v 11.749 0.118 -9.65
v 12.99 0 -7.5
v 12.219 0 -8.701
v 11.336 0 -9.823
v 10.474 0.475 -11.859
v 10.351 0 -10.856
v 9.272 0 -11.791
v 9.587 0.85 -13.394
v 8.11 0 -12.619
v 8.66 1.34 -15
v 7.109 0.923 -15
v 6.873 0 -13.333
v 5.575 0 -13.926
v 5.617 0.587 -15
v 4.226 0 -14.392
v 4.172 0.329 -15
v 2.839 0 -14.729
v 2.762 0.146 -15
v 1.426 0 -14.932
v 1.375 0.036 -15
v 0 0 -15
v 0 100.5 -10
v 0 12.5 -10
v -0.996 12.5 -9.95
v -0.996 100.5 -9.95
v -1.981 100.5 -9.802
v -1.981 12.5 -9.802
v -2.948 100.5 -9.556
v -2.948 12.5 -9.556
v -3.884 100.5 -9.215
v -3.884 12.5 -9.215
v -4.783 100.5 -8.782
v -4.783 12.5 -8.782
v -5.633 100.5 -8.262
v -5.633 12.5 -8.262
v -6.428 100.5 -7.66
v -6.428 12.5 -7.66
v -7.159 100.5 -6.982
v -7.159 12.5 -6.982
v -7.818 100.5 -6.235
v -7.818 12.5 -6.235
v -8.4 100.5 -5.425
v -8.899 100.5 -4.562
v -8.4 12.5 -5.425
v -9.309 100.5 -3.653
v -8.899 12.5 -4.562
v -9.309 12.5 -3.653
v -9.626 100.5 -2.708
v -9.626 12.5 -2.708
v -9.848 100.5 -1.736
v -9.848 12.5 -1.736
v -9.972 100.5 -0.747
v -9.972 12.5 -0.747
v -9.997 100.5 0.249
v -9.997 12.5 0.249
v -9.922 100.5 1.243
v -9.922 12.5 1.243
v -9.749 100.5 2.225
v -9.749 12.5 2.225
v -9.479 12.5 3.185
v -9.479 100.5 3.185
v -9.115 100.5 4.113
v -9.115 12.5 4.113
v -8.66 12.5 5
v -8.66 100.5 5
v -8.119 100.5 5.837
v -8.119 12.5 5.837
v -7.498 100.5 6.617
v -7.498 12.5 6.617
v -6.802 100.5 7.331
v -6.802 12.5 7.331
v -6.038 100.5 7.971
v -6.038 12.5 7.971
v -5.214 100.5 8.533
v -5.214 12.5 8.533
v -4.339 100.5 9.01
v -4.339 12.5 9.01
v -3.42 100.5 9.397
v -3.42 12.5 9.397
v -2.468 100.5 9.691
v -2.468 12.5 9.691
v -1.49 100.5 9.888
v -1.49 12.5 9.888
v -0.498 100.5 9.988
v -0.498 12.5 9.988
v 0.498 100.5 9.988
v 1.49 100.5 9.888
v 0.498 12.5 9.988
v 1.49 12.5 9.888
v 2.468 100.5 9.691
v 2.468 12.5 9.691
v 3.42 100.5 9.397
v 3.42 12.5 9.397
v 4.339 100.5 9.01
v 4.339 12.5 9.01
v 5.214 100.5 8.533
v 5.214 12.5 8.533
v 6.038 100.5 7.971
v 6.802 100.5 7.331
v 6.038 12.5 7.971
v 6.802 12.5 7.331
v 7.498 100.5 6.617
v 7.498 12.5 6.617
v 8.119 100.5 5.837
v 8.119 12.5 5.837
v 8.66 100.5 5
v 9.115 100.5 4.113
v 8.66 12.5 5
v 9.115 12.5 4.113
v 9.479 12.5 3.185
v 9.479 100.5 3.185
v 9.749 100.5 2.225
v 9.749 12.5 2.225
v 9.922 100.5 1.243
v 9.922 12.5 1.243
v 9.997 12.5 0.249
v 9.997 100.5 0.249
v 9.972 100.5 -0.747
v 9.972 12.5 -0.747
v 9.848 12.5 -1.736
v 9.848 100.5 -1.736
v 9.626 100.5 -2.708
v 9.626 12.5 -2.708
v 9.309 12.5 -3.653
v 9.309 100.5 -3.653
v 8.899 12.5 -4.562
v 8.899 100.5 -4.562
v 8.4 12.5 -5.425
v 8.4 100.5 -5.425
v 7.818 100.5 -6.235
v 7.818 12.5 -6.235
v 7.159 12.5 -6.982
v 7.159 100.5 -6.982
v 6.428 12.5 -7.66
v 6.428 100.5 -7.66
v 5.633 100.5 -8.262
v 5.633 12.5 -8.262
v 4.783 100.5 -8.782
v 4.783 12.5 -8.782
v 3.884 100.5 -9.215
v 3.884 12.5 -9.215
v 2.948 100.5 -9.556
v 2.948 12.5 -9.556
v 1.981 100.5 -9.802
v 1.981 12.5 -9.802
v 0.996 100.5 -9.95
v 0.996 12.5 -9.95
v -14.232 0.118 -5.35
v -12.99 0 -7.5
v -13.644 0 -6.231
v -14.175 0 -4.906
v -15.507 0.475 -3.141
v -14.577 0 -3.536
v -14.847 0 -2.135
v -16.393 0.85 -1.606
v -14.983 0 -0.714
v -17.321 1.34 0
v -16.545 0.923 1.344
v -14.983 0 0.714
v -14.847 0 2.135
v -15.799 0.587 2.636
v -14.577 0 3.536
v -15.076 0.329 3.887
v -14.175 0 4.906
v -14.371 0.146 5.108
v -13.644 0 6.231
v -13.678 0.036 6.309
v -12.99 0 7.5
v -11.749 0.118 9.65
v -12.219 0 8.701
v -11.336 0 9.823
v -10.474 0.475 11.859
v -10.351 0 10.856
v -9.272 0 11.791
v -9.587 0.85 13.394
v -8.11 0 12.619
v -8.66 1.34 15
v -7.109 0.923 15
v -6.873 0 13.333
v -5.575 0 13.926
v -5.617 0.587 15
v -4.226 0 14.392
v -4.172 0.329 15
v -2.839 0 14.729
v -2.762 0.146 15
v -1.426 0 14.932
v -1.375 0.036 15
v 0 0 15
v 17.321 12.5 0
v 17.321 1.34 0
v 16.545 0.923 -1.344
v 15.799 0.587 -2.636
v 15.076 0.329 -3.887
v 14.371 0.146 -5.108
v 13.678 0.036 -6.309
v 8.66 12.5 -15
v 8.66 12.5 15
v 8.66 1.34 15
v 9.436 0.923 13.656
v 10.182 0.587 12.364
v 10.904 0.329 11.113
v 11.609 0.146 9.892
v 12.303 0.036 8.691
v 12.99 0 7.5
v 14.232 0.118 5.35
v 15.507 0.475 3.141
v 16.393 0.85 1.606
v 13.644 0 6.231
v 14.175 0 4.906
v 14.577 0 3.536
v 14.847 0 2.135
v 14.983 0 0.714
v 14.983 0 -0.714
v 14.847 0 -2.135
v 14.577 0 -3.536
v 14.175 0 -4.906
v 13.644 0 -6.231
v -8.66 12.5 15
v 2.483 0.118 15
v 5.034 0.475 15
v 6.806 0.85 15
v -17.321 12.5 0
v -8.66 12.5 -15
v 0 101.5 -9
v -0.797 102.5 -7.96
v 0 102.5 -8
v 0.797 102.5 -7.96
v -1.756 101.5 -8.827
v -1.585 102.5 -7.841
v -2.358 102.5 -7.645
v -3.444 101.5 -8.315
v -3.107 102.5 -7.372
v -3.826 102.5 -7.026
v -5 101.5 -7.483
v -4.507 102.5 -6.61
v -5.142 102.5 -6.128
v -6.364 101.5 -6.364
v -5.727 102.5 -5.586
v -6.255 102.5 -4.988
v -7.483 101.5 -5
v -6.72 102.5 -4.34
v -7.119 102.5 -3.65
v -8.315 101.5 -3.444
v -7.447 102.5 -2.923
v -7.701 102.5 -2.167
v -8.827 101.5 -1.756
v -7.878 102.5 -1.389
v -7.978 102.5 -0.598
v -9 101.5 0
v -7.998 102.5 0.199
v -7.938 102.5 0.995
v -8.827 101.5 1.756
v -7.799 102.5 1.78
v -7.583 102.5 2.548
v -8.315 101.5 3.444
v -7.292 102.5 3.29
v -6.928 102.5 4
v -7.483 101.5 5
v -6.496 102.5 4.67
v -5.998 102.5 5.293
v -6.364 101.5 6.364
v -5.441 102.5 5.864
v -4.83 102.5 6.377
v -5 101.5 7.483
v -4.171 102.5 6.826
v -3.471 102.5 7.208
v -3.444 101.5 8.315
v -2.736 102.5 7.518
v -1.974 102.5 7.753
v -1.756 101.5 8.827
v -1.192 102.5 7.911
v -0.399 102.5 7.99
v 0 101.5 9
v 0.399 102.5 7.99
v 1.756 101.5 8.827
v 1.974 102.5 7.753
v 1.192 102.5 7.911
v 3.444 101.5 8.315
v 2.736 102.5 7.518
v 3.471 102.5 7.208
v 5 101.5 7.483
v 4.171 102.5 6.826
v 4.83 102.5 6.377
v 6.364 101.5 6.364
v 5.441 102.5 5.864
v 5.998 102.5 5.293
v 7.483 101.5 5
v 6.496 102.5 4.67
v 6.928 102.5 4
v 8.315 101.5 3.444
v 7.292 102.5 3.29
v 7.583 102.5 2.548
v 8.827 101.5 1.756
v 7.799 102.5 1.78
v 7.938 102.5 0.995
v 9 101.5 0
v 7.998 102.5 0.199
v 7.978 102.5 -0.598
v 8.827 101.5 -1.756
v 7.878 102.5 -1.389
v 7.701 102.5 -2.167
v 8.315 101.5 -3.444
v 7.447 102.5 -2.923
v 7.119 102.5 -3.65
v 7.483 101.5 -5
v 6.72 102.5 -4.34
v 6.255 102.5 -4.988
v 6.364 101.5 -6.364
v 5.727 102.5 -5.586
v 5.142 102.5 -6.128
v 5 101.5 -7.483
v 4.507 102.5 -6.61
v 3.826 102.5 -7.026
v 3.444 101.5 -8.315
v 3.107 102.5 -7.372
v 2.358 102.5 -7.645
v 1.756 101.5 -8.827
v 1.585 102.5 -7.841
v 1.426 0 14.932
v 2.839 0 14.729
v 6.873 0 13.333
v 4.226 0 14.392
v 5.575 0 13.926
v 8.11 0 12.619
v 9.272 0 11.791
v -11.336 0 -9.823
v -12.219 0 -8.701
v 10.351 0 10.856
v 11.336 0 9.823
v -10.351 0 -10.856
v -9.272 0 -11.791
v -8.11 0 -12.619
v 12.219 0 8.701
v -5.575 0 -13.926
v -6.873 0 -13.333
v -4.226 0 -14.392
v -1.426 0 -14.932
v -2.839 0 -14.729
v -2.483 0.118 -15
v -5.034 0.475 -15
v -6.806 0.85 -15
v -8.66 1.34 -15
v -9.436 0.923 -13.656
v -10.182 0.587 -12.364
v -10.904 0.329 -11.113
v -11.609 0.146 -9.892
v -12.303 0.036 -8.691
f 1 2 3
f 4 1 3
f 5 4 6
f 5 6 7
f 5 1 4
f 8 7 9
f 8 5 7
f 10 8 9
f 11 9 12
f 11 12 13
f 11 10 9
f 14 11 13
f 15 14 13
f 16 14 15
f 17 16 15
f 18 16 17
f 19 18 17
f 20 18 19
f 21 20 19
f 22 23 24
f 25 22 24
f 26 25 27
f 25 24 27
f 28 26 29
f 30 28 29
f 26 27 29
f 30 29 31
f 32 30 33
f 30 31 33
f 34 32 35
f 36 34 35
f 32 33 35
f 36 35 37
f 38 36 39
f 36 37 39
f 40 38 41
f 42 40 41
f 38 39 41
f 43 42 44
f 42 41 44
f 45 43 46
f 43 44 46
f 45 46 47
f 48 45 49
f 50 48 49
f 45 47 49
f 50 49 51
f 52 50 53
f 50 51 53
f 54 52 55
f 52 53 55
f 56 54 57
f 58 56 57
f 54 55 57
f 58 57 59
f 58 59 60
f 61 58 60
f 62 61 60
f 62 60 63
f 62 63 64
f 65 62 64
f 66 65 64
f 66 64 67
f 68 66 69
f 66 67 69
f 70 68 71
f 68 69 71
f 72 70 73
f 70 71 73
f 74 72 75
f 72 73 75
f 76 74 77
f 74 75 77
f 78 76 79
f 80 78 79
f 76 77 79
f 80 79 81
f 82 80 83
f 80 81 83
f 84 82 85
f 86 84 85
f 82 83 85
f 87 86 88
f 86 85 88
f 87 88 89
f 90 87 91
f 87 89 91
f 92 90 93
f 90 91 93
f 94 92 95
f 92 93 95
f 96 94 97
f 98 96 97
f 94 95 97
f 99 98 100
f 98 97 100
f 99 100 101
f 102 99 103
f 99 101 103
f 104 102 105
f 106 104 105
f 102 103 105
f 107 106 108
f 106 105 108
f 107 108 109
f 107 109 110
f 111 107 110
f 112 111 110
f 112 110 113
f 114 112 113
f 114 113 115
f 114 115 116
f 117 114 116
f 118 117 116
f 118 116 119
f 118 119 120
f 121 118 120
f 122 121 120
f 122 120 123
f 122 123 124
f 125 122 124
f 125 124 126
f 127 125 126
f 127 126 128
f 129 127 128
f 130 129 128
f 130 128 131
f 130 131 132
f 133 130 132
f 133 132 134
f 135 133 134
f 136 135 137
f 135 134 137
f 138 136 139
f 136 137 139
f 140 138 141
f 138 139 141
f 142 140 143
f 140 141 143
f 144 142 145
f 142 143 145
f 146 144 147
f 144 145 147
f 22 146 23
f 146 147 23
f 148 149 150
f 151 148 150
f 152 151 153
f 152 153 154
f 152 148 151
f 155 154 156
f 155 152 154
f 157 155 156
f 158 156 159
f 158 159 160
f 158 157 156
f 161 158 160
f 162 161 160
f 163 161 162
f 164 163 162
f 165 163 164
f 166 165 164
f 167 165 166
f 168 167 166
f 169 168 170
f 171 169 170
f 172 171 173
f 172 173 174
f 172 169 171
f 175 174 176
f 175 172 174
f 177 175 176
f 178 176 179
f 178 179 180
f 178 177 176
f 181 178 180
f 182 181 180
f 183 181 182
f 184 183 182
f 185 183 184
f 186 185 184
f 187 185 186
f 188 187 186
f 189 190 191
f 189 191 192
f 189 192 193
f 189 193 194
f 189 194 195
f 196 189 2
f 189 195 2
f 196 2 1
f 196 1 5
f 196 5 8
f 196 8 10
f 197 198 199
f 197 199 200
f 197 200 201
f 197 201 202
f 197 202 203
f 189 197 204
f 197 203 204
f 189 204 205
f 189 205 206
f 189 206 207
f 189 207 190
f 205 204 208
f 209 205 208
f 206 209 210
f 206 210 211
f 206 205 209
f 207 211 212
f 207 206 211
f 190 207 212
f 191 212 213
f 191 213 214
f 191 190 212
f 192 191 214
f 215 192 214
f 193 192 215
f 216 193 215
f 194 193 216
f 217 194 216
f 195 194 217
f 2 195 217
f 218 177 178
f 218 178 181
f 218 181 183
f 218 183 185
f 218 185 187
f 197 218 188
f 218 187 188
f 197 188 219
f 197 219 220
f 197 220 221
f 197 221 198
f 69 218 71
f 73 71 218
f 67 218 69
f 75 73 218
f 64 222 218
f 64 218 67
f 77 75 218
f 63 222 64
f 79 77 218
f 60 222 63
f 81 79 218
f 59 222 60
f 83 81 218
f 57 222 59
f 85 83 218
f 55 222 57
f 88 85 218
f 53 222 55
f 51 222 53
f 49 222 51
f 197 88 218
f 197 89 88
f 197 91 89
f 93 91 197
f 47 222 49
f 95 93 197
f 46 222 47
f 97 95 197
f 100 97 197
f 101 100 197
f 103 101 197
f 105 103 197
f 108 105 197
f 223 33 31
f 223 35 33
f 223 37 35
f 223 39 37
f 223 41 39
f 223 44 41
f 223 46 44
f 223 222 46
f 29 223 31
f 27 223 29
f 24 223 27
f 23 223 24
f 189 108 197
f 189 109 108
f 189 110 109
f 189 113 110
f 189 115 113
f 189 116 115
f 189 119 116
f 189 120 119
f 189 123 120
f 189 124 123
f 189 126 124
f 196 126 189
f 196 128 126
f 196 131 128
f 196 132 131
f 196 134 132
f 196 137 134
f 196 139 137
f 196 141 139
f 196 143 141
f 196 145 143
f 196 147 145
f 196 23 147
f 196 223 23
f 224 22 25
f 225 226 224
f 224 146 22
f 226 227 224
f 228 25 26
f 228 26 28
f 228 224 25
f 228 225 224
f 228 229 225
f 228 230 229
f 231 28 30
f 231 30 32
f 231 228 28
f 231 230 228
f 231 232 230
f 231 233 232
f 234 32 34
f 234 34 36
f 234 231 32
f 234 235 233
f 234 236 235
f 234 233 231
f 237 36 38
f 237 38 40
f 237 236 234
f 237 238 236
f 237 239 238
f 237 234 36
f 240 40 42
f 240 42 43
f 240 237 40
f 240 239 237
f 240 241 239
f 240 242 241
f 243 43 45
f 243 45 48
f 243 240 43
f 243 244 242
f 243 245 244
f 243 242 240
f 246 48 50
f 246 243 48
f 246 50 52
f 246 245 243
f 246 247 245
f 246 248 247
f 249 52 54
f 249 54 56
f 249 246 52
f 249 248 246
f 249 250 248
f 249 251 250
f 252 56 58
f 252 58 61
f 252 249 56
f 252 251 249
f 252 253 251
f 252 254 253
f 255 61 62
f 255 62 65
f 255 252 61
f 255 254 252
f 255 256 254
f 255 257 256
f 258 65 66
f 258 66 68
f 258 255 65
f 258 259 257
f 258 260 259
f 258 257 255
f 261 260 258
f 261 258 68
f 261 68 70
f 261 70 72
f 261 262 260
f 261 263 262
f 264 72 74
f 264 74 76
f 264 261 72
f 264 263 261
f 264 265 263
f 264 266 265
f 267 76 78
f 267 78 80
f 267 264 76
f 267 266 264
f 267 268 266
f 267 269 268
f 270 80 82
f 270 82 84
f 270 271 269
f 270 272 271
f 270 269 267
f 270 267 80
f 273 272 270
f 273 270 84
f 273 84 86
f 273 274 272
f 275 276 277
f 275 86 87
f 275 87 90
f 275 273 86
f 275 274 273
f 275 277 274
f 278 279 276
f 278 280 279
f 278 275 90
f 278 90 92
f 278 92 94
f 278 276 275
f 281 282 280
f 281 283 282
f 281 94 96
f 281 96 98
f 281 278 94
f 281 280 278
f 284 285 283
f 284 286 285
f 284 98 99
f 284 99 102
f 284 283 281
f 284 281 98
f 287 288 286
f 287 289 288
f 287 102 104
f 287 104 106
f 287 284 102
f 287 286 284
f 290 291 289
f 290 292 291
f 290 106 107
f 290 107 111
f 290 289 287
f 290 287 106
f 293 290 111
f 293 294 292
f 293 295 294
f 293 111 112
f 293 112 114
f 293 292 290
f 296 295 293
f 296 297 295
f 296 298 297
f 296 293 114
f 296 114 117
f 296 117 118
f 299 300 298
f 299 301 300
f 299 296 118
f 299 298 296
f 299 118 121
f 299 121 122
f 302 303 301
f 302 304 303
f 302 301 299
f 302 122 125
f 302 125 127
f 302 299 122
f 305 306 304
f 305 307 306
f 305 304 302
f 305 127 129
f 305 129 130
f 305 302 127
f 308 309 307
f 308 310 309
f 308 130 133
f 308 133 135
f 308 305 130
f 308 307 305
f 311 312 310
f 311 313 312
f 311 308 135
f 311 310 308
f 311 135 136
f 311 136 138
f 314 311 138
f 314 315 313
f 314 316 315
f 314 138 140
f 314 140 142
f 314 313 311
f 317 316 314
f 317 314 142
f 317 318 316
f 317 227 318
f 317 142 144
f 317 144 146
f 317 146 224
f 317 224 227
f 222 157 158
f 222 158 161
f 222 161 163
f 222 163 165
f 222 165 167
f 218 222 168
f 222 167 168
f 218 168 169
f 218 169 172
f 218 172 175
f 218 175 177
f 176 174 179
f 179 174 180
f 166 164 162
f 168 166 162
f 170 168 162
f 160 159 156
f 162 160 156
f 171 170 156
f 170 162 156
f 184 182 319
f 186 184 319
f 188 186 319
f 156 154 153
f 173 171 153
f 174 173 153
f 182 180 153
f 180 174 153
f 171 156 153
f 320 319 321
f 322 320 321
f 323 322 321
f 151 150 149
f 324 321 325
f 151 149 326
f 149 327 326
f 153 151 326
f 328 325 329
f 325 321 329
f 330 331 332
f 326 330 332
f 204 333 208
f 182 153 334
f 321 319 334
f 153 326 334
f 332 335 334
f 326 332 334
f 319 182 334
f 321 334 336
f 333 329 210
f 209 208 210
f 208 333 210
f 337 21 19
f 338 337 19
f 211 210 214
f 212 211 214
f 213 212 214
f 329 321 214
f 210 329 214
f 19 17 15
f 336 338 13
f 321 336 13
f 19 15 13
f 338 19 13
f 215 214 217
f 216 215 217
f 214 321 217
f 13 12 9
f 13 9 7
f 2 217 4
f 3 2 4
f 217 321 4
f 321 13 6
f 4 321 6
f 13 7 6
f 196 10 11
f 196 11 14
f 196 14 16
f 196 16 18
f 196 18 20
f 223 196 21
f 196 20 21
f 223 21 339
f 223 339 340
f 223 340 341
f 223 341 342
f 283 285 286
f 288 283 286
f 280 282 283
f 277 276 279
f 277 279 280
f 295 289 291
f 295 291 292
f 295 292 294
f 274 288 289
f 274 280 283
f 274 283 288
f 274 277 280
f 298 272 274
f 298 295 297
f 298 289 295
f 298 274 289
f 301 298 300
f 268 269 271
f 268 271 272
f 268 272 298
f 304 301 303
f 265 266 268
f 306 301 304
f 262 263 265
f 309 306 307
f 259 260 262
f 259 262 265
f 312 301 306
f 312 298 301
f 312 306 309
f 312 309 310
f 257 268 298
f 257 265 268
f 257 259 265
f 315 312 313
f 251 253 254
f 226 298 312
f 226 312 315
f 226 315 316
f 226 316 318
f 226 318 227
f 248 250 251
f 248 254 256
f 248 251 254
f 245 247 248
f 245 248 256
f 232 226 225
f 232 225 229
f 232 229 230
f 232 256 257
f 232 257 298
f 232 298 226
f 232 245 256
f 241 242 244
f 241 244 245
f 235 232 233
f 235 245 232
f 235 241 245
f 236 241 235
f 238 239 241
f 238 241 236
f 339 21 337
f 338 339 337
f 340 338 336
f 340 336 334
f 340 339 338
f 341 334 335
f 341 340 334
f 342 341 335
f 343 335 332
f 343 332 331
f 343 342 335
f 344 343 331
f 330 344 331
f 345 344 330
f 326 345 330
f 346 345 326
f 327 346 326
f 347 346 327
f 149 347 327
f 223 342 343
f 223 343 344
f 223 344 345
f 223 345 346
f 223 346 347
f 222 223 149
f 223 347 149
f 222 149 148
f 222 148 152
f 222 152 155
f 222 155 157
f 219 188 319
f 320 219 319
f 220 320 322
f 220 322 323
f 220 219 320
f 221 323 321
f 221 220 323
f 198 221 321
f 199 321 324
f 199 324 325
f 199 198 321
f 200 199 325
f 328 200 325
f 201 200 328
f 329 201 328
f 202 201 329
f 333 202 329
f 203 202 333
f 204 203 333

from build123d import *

# Parameters (mm, degrees)
EXTRUDE_1_DEPTH = 12.5
SKETCH_2_R      = 10
EXTRUDE_2_DEPTH = 90
CHAMFER_1_SIZE  = 2


with BuildPart() as part:
    # 草图1 → 凸台-拉伸1 (new body)
    with BuildSketch(Plane(origin=(0, 0, 0), x_dir=(1, 0, 0), z_dir=(0, 1, 0))):
        Polygon((8.660254038, -15), (17.320508076, 0), (8.660254038, 15), (-8.660254038, 15), (-17.320508076, 0), (-8.660254038, -15), align=None)
    extrude(amount=EXTRUDE_1_DEPTH)

    # 草图2 → 凸台-拉伸2 (add)
    with BuildSketch(Plane(origin=(0, 12.5, 0), x_dir=(1, 0, 0), z_dir=(0, 1, 0))):
        with Locations(Location((0, 0, 0), (0, 0, 90))):
            Circle(SKETCH_2_R)
    extrude(amount=EXTRUDE_2_DEPTH)

    # 倒角1
    chamfer_1_edges = [part.edges().sort_by_distance(p)[0] for p in [
        (0, 102.5, 10),
    ]]
    chamfer(chamfer_1_edges, length=CHAMFER_1_SIZE)

    # 草图3 → 切除-旋转3 (revolve, cut)
    with BuildSketch(Plane(origin=(8.660254038, 0, 0), x_dir=(1, 0, 0), z_dir=(0, 0, 1))):
        Polygon((-23.660254038, 0), (-25.980762114, 1.339745962), (-25.980762114, 0), align=None)
    revolve(axis=Axis((0, 0, 0), (0, 1, 0)), mode=Mode.SUBTRACT)


solid = part.part
